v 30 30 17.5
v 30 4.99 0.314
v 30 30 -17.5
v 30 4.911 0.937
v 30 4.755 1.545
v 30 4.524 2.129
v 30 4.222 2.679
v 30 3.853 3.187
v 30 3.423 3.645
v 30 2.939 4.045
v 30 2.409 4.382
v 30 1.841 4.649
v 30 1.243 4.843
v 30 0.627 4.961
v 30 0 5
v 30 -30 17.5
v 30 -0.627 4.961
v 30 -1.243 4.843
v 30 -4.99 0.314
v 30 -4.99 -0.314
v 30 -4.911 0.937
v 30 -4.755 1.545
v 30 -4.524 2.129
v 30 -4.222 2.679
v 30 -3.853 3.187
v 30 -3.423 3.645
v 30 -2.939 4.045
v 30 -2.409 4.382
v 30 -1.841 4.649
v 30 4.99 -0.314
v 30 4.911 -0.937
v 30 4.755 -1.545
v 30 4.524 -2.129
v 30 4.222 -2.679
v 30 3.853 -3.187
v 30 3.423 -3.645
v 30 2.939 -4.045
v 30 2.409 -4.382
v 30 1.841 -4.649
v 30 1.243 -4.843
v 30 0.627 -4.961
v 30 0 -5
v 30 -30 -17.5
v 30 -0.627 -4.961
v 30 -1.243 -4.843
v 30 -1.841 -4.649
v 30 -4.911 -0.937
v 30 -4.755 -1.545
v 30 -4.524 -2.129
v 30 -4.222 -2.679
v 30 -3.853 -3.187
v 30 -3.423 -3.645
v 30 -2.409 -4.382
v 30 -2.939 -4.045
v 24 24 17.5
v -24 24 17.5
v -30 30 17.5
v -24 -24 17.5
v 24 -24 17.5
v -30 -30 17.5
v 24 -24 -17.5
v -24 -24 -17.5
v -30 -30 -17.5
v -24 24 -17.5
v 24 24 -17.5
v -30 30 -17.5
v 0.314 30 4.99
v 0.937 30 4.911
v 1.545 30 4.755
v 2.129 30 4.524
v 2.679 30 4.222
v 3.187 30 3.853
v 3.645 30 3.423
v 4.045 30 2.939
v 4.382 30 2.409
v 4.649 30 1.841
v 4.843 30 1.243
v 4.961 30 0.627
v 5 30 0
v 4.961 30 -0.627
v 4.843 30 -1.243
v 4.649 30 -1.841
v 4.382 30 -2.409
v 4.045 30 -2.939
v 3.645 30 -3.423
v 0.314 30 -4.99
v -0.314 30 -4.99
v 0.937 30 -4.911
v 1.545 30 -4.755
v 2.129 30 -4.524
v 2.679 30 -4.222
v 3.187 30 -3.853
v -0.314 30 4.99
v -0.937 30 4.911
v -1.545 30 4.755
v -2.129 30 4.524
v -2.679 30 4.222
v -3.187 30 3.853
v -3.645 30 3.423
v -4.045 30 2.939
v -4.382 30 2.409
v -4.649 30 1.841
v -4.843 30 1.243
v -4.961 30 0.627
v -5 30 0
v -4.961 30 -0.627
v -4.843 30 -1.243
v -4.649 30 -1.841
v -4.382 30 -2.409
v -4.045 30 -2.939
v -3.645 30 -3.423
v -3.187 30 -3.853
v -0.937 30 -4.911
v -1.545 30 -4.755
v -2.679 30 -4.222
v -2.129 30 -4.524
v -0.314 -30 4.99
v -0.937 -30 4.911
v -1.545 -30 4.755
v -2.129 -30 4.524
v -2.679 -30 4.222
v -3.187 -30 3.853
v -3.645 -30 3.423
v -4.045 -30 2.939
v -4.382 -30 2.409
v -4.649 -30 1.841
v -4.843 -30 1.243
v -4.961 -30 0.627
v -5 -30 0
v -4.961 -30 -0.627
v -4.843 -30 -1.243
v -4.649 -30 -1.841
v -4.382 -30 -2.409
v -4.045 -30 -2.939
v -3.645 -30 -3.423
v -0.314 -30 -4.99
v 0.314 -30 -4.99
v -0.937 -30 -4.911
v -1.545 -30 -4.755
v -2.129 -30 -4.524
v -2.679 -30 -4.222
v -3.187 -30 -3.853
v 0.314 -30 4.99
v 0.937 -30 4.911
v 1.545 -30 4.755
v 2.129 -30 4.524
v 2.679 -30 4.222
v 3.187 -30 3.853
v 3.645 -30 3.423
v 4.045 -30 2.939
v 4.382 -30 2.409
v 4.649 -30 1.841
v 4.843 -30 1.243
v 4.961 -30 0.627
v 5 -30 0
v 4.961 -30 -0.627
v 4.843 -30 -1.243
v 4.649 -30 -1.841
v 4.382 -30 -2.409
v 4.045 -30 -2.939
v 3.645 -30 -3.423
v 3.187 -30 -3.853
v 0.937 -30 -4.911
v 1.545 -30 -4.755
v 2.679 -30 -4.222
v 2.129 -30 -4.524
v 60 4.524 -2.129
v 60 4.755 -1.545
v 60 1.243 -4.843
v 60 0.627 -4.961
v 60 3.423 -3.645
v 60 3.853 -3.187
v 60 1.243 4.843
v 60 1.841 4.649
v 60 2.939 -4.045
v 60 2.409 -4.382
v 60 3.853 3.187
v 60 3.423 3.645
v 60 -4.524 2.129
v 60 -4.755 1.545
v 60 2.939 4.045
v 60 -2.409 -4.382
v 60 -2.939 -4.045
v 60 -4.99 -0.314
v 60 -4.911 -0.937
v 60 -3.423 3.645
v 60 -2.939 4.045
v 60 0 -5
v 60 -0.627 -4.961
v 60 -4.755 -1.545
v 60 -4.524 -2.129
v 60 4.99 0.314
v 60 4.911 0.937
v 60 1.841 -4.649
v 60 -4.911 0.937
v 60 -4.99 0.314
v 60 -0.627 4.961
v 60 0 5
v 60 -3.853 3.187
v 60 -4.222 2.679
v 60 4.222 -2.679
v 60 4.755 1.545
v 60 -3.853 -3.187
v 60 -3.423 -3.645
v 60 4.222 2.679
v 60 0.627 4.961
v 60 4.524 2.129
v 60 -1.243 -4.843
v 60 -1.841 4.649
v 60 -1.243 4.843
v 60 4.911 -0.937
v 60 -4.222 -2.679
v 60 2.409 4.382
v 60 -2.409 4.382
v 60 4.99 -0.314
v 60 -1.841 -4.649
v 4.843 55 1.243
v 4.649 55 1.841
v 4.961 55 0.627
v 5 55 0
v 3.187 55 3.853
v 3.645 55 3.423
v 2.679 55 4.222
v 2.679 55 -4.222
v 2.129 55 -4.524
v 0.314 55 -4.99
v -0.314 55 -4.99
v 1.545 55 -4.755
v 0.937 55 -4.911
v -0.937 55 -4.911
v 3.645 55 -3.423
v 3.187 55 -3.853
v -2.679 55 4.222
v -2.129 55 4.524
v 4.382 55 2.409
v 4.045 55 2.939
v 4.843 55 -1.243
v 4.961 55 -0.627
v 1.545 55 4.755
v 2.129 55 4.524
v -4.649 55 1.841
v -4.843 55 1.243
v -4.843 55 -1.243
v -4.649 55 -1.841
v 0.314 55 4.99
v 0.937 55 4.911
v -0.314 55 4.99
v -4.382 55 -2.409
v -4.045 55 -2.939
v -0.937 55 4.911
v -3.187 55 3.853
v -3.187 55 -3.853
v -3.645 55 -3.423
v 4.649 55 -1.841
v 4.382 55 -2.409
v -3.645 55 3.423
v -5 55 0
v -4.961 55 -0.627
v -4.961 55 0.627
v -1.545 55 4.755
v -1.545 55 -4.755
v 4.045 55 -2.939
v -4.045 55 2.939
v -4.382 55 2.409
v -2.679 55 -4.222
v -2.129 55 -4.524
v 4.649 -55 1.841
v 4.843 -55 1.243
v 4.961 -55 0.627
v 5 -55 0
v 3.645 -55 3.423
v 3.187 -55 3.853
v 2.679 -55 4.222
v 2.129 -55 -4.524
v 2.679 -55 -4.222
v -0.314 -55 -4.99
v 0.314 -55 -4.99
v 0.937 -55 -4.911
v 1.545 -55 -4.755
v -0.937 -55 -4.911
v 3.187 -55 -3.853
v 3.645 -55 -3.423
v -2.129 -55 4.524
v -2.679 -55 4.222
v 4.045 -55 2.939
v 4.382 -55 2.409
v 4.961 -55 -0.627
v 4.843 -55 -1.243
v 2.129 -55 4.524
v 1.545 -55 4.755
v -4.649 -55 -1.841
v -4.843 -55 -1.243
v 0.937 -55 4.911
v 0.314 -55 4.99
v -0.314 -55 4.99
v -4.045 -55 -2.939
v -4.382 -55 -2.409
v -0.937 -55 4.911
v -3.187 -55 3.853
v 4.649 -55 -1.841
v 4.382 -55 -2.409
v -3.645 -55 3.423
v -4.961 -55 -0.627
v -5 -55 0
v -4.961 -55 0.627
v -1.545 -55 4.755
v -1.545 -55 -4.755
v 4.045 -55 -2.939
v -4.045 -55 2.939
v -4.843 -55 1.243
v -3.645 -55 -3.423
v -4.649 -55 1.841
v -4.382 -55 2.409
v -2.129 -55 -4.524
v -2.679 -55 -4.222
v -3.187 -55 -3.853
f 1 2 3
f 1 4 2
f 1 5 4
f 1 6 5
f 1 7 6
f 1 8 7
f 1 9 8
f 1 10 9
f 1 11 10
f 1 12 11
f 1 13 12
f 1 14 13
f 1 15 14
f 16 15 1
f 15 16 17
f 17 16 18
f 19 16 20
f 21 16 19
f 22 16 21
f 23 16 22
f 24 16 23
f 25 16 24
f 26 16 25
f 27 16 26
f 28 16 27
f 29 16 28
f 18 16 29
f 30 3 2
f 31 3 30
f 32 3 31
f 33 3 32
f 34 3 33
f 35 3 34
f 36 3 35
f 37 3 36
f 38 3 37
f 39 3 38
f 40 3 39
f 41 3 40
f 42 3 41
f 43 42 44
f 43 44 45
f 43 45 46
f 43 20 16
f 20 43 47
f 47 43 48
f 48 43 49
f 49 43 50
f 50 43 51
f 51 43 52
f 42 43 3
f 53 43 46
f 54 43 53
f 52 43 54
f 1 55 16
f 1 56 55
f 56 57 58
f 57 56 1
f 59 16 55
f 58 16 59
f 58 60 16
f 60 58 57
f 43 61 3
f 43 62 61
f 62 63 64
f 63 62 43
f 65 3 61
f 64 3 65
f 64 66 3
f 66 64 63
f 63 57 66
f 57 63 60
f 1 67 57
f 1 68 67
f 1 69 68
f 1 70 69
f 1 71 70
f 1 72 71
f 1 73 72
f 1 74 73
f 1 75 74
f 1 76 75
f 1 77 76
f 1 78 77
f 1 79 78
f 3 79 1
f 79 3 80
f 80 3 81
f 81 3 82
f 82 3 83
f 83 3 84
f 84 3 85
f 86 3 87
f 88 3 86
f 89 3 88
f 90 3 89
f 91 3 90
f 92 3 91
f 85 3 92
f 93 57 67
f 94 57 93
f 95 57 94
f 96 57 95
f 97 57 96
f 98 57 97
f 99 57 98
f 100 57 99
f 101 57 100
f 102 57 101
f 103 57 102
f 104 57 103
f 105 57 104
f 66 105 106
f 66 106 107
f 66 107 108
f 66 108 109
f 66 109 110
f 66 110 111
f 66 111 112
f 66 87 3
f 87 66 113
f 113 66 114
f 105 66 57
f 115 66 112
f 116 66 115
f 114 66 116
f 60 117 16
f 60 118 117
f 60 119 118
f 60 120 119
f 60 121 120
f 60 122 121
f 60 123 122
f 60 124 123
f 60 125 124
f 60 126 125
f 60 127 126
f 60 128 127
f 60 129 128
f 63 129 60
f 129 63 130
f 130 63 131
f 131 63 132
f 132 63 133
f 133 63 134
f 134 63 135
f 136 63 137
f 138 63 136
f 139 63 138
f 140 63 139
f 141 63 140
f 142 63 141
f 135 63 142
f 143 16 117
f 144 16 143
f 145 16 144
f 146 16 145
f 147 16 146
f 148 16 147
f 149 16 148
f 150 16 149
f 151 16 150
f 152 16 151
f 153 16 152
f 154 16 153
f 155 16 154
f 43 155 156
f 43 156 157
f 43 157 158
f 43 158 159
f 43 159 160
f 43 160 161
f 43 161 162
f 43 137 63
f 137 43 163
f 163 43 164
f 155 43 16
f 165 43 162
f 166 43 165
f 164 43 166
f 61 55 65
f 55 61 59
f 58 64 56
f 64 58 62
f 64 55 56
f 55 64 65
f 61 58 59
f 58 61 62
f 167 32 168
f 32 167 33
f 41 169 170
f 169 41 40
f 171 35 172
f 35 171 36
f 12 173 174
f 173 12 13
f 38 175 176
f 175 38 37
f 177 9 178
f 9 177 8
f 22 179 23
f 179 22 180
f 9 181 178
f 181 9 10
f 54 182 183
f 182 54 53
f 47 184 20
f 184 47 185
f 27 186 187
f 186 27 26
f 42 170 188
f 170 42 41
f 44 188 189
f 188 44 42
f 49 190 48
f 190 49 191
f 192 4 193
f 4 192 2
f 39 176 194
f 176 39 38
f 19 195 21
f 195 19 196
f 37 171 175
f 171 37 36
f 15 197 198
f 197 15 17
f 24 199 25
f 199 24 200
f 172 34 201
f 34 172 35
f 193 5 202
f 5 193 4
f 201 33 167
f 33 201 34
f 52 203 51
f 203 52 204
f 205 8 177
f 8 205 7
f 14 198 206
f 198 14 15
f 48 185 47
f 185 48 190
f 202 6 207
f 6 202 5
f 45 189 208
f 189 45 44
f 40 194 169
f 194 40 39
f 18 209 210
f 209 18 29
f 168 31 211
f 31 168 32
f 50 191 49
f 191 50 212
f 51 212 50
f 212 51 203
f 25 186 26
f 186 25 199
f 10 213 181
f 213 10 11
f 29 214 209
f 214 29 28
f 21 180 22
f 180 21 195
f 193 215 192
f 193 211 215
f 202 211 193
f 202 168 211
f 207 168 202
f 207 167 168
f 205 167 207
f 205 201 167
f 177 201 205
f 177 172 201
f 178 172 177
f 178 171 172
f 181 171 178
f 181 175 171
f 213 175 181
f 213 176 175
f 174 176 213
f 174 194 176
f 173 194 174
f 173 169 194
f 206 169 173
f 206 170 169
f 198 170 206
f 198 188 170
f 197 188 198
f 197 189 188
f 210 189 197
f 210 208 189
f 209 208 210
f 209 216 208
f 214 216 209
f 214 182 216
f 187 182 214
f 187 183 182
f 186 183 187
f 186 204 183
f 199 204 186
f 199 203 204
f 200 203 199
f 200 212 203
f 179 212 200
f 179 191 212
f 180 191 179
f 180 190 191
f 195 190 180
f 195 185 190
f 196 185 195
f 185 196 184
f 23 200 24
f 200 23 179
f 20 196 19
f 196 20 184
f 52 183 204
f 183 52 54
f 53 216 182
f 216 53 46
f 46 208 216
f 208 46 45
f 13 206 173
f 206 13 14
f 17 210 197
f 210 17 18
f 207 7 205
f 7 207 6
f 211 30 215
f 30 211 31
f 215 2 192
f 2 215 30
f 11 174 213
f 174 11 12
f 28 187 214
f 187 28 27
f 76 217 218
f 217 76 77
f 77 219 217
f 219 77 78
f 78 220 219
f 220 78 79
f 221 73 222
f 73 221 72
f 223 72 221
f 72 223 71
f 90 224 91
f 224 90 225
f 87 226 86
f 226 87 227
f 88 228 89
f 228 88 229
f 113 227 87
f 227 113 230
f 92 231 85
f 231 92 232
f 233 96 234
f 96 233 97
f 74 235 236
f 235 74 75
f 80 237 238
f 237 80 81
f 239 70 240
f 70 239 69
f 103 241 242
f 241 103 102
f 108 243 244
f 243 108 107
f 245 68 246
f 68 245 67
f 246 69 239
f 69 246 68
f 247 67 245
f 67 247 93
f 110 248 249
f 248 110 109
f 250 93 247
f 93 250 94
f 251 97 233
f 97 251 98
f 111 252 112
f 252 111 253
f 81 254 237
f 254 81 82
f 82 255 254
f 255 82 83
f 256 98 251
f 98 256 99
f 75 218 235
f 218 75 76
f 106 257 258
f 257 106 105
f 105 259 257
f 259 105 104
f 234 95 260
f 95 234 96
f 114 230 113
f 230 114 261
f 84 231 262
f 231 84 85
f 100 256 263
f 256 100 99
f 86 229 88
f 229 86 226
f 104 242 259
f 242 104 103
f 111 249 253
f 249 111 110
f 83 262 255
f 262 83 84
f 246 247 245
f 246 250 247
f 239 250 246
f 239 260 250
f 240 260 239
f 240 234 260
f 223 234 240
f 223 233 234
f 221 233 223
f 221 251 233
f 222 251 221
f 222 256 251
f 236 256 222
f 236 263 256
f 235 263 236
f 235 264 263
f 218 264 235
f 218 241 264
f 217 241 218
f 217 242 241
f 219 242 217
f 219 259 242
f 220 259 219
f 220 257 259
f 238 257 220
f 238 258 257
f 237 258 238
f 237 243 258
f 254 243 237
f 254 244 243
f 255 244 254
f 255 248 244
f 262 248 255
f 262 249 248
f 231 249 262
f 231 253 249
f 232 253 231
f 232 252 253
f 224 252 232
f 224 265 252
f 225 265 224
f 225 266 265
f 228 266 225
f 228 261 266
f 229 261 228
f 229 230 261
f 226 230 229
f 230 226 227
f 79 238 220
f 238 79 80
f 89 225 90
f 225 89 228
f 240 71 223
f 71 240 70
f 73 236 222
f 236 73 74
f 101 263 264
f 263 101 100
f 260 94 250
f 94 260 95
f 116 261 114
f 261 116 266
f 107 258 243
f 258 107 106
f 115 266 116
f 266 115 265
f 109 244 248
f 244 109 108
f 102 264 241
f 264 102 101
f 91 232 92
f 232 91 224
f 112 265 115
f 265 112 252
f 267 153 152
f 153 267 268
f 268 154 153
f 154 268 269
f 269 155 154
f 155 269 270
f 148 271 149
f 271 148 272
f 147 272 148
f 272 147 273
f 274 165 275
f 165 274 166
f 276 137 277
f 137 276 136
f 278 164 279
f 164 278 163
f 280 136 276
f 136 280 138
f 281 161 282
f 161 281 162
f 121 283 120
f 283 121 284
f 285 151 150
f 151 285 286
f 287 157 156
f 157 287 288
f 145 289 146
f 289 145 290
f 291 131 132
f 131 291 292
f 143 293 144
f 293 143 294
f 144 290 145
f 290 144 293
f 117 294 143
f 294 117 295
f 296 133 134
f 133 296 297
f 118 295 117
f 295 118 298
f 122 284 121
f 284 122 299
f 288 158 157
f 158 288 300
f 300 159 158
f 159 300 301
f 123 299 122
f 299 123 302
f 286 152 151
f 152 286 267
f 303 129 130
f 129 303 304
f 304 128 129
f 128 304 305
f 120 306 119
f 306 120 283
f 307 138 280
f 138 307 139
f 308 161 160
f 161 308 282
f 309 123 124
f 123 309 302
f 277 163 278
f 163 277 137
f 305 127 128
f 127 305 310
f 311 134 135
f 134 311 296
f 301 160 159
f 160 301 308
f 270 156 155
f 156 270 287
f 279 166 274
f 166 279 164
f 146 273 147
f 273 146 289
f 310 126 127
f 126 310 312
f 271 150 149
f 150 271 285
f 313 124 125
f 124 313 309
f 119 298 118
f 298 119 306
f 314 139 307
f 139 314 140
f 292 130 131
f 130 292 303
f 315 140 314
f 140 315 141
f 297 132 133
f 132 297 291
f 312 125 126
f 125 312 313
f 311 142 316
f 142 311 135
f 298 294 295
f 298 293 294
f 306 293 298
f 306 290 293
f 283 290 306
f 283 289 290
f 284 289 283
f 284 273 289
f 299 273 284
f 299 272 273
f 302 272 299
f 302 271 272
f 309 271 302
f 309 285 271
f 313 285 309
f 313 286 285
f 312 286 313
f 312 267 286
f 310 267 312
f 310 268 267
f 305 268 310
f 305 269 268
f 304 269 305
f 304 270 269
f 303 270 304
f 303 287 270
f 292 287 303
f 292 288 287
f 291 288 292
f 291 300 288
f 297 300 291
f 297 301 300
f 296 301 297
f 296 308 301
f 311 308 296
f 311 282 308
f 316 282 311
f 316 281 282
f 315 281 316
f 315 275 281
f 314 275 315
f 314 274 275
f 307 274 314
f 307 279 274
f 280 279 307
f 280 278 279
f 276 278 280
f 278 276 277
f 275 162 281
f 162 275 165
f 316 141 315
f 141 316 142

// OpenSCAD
breite_gehaeuse = 60;
tiefe_gehaeuse = 60;
hoehe_gehaeuse = 35;
wandstaerke = 6;

durchmesser_achse_x_rechts = 10;
ueberstand_achse_x_rechts = 30;

durchmesser_achse_y = 10;
ueberstand_achse_y = 25;


union() {
    difference() {
        cube([breite_gehaeuse, tiefe_gehaeuse, hoehe_gehaeuse], center = true);
        cube([breite_gehaeuse - 2 * wandstaerke, tiefe_gehaeuse - 2 * wandstaerke, hoehe_gehaeuse], center = true);
    }

    translate([breite_gehaeuse/2 + ueberstand_achse_x_rechts/2, 0, 0]) {
        rotate([0, 90, 0]) {
            cylinder(h = ueberstand_achse_x_rechts, d = durchmesser_achse_x_rechts, center = true, $fn = 50);
        }
    }

    translate([0, tiefe_gehaeuse/2 + ueberstand_achse_y/2, 0]) {
        rotate([90, 0, 0]) {
            cylinder(h = ueberstand_achse_y, d = durchmesser_achse_y, center = true, $fn = 50);
        }
    }

    translate([0, -tiefe_gehaeuse/2 - ueberstand_achse_y/2, 0]) {
        rotate([90, 0, 0]) {
            cylinder(h = ueberstand_achse_y, d = durchmesser_achse_y, center = true, $fn = 50);
        }
    }
}
